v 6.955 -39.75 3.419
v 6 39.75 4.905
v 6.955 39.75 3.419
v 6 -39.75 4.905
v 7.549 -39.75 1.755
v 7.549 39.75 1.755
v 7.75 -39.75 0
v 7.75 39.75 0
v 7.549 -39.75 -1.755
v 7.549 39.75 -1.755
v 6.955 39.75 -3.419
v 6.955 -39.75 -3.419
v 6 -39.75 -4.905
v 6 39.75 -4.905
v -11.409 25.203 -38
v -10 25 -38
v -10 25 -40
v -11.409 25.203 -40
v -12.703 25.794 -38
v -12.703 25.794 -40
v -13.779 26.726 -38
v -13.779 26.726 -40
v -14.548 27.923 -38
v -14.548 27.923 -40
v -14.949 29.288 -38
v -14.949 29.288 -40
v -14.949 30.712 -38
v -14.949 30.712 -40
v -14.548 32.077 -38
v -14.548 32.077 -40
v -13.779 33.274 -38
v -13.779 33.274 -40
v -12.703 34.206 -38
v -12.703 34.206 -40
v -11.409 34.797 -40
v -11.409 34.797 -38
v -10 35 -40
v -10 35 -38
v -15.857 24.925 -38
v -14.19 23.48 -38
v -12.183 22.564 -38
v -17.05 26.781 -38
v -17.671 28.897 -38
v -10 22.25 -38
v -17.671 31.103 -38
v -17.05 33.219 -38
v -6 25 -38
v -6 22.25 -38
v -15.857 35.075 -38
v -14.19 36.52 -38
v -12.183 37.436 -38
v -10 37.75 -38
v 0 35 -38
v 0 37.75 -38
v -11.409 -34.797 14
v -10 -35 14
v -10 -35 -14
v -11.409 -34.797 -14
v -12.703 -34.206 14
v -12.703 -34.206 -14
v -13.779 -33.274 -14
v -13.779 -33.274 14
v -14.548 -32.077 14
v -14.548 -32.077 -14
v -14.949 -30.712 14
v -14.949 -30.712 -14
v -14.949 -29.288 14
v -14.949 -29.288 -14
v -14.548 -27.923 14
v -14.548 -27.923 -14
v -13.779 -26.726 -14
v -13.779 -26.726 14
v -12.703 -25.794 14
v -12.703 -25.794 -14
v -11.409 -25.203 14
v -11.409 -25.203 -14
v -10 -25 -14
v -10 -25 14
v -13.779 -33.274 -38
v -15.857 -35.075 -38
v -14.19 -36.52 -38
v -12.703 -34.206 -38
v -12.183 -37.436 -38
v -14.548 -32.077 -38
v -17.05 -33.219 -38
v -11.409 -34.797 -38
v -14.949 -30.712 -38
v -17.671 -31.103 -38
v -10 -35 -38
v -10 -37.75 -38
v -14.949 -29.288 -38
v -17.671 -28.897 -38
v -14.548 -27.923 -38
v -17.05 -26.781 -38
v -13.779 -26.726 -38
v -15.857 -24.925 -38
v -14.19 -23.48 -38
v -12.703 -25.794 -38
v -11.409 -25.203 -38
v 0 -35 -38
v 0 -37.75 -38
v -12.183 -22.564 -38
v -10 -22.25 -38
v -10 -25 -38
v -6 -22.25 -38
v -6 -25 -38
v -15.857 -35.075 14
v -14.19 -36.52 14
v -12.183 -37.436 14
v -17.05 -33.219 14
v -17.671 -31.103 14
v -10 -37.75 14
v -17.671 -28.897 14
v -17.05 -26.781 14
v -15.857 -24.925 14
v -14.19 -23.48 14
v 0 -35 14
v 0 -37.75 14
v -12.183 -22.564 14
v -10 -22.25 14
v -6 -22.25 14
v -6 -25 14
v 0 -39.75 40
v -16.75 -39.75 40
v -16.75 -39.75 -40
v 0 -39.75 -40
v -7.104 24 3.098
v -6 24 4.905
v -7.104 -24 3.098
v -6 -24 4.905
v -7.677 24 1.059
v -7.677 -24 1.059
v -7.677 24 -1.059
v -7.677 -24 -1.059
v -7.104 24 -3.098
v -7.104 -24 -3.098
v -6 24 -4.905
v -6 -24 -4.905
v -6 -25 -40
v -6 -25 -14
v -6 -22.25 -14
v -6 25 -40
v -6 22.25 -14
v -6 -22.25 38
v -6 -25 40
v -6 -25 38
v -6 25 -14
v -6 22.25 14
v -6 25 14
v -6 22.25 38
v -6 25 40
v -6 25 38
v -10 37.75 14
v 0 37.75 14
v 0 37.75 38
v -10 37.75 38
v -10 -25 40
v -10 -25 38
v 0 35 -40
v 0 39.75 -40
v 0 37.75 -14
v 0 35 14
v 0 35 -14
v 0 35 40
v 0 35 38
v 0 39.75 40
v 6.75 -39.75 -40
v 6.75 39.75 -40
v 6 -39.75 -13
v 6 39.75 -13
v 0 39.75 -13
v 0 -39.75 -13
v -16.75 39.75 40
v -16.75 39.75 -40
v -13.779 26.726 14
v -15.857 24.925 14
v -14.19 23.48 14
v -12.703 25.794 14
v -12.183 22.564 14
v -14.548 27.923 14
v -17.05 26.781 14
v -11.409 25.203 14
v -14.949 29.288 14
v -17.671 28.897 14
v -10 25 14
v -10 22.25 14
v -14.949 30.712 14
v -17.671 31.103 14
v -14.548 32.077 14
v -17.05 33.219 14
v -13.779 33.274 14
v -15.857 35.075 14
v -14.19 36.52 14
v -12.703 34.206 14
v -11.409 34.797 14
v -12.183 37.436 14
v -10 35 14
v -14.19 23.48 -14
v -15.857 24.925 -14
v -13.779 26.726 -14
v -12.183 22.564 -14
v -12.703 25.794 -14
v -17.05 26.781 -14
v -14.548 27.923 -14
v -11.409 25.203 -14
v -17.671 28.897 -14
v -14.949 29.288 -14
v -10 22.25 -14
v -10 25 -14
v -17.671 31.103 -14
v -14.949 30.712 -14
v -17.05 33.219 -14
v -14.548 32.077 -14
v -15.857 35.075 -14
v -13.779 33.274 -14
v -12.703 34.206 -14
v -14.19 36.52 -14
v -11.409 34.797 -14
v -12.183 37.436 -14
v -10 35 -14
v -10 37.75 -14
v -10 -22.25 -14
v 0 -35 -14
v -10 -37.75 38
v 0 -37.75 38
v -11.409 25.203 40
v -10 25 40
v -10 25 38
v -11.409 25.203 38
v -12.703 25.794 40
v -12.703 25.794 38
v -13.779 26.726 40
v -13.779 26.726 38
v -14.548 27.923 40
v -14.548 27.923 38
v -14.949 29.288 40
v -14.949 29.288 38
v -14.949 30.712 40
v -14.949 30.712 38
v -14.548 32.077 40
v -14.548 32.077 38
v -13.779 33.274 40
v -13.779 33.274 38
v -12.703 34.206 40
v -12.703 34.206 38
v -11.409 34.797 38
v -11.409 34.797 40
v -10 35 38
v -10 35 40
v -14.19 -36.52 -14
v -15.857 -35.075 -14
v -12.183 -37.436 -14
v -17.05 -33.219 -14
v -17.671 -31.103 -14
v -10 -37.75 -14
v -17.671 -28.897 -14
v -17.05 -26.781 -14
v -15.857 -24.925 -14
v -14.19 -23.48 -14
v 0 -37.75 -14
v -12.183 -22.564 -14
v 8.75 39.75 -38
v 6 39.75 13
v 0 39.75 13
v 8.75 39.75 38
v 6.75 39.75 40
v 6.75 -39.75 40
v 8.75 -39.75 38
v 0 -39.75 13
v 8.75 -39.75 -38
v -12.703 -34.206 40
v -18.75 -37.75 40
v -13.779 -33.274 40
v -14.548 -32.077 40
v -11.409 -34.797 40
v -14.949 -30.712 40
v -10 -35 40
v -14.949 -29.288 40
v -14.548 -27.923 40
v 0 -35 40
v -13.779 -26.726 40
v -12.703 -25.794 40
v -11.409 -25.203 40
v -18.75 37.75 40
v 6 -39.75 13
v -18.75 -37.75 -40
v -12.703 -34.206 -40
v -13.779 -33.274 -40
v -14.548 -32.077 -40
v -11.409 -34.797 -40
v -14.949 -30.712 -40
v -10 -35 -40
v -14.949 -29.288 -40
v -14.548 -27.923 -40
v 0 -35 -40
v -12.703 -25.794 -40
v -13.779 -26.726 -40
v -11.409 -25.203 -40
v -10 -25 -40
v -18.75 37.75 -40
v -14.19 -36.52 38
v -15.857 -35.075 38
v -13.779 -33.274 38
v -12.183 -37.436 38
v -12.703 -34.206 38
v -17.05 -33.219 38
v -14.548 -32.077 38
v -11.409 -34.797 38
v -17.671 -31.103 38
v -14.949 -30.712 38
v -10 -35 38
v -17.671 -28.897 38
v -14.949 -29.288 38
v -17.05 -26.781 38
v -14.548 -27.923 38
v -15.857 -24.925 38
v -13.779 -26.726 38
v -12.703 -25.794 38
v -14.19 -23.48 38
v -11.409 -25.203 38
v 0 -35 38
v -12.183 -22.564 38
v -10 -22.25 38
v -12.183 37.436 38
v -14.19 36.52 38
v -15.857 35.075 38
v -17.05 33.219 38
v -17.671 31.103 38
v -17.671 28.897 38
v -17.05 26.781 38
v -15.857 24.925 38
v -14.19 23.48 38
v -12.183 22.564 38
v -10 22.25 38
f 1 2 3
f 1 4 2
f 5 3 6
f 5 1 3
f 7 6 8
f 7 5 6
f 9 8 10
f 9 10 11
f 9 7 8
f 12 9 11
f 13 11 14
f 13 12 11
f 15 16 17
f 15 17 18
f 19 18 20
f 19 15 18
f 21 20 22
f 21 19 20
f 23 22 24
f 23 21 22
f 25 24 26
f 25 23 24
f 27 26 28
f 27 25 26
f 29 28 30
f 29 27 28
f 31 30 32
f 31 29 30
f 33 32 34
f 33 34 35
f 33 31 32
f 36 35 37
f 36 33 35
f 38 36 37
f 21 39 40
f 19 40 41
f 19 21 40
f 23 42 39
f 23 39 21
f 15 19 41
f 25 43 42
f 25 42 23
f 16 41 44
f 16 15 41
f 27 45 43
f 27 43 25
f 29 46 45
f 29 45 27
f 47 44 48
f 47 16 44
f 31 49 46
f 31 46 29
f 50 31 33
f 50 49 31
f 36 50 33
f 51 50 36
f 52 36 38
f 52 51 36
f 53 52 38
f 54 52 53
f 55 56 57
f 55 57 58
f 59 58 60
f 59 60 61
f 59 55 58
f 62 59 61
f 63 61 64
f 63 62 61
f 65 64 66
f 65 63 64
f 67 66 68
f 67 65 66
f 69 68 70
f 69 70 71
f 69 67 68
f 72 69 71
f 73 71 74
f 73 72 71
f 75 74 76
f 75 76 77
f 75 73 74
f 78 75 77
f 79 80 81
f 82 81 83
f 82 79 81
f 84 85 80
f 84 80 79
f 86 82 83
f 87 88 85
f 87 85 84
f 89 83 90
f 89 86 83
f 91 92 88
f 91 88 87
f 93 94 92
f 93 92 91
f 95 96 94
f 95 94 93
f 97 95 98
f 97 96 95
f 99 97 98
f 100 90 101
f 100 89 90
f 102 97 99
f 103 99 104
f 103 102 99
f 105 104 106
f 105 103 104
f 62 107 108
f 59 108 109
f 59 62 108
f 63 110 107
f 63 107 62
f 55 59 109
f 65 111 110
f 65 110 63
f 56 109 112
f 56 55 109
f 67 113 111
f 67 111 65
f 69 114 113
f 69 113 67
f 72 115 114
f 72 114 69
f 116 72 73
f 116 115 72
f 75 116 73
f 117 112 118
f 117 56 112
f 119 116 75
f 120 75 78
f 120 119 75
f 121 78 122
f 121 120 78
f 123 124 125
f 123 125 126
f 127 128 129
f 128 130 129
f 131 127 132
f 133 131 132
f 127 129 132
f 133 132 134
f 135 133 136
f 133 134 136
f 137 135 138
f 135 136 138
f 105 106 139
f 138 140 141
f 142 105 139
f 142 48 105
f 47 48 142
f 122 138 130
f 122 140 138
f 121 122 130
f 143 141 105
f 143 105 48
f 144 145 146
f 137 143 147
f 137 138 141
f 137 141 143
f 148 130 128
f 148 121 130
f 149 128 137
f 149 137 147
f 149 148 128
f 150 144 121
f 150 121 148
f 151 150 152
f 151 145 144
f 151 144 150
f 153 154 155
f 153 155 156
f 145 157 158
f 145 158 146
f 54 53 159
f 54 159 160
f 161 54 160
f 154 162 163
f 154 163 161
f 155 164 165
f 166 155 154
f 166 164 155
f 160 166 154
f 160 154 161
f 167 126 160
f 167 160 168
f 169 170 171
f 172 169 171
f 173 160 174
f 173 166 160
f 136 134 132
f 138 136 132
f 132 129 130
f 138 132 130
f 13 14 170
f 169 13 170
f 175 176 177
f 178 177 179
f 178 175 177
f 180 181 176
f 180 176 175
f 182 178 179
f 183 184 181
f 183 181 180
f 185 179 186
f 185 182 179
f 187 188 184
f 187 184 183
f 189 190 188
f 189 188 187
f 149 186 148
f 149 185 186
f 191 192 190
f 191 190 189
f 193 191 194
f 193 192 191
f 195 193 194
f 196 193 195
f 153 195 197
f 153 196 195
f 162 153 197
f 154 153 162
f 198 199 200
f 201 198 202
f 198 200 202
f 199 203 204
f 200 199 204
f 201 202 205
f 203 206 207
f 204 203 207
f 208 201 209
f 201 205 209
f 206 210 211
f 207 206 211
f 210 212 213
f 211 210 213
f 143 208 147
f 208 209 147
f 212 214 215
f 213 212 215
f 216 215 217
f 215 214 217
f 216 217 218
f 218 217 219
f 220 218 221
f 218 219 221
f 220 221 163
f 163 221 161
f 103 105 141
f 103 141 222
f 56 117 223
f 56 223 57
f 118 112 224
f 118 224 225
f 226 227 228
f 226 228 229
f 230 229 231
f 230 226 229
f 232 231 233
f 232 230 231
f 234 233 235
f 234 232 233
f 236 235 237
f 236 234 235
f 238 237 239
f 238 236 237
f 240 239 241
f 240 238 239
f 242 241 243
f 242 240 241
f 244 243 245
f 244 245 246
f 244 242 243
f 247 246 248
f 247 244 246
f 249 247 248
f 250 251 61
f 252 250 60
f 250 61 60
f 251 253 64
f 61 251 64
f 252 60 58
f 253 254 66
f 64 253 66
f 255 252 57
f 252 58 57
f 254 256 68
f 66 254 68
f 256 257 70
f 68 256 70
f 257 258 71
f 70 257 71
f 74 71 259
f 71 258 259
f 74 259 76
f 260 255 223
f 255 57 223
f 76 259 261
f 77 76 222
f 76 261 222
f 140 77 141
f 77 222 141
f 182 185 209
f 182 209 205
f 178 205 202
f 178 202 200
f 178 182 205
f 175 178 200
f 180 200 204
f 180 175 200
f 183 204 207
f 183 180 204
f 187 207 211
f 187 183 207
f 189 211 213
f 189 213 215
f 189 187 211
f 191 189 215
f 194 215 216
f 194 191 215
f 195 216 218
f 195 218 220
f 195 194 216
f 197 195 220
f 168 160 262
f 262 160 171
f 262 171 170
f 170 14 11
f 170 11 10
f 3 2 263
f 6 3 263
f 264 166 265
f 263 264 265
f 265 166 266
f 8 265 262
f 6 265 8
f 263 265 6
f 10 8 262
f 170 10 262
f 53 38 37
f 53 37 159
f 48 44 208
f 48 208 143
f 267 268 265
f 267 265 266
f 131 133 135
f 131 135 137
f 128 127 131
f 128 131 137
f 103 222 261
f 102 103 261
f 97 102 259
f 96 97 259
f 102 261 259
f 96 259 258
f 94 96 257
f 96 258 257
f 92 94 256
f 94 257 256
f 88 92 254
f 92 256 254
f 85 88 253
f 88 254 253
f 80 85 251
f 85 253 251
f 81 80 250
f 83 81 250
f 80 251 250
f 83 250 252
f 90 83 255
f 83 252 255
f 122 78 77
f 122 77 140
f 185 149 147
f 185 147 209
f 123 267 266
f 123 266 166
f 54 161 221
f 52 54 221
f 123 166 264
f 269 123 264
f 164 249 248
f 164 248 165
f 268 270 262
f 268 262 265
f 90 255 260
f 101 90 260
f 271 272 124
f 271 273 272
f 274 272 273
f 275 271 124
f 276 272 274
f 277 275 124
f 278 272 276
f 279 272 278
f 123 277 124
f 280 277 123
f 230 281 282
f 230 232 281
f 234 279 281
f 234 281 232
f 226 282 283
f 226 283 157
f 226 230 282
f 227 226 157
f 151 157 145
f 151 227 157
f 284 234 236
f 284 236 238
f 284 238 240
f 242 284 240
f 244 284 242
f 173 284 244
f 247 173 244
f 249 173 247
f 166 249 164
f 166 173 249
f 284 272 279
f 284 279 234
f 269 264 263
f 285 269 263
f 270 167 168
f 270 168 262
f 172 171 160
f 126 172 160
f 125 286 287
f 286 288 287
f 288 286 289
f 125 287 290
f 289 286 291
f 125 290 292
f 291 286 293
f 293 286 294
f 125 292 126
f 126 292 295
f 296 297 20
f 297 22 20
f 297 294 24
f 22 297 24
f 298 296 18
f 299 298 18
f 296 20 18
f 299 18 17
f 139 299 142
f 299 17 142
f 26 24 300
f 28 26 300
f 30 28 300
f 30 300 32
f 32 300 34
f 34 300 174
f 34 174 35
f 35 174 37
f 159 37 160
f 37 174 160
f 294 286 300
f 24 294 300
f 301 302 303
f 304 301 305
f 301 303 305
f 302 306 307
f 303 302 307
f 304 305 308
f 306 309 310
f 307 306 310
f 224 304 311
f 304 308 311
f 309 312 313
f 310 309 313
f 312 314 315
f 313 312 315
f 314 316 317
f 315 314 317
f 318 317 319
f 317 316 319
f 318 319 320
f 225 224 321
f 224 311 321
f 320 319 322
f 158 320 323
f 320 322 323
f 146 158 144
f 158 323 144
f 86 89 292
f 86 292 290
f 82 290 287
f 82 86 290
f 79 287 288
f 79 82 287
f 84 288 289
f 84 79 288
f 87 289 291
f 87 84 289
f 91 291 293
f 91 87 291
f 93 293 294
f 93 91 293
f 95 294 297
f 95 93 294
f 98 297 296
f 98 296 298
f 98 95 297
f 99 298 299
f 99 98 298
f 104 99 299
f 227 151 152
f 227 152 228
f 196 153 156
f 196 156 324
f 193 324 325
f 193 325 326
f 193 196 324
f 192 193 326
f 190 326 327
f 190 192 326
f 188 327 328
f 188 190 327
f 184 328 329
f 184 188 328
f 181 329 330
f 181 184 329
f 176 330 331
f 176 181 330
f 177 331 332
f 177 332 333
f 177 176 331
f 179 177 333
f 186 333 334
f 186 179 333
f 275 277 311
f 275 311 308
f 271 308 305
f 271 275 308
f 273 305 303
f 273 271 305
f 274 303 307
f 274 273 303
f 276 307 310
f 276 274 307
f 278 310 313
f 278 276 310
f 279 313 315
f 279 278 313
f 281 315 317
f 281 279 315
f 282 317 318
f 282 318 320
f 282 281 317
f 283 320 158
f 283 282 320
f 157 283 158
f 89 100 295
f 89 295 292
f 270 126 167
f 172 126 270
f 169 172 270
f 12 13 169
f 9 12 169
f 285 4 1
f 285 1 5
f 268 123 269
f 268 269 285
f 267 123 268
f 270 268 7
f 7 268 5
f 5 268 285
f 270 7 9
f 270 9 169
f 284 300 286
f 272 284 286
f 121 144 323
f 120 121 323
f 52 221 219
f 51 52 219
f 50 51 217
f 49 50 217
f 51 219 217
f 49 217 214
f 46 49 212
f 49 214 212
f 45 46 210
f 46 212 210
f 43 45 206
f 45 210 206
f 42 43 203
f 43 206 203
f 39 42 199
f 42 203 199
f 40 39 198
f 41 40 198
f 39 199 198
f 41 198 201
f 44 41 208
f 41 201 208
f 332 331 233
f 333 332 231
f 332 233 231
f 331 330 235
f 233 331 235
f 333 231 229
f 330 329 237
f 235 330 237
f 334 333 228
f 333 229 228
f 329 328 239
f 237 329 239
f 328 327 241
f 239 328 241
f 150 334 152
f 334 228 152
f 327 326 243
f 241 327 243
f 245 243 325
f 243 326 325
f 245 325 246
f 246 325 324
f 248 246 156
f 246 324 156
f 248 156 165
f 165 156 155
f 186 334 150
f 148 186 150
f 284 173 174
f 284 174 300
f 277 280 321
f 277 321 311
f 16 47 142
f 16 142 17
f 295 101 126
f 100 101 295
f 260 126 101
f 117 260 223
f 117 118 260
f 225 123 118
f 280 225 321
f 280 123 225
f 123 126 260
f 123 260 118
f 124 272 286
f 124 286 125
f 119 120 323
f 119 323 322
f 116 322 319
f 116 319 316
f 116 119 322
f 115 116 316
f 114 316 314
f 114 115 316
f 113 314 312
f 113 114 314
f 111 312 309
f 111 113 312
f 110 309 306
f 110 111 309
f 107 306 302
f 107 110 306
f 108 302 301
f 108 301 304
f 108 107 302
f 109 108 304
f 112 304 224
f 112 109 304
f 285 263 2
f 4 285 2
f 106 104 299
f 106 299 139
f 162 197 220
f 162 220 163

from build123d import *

# Parameters (mm, degrees)
F2_DEPTH = 40
F3_START = 14
F3_DEPTH = 24
F4_START = -14
F4_DEPTH = 24
F6_DEPTH = 24
F7_DEPTH = 39.75


with BuildPart() as f2:
    # F1 (on Top) → F2 (new body, symmetric)
    with BuildSketch(Plane.XY):
        with BuildLine():
            ThreePointArc((-10, 22.25), (-17.75, 30), (-10, 37.75))
            Line((-10, 37.75), (0, 37.75))
            Line((0, 37.75), (0, 39.75))
            Line((0, 39.75), (-10, 39.75))
            Line((-10, 39.75), (-16.75, 39.75))
            Line((-16.75, 39.75), (-18.75, 37.75))
            Line((-18.75, 37.75), (-18.75, -37.75))
            Line((-18.75, -37.75), (-16.75, -39.75))
            Line((-16.75, -39.75), (-10, -39.75))
            Line((-10, -39.75), (0, -39.75))
            Line((0, -39.75), (0, -37.75))
            Line((0, -37.75), (-10, -37.75))
            ThreePointArc((-10, -37.75), (-17.75, -30), (-10, -22.25))
            Line((-10, -22.25), (-6, -22.25))
            Line((-6, -22.25), (-6, 22.25))
            Line((-6, 22.25), (-10, 22.25))
        make_face()
        with BuildLine():
            Line((0, 37.75), (-10, 37.75))
            ThreePointArc((-10, 37.75), (-17.75, 30), (-10, 22.25))
            Line((-10, 22.25), (-6, 22.25))
            Line((-6, 22.25), (-6, 25))
            Line((-6, 25), (-10, 25))
            ThreePointArc((-10, 25), (-15, 30), (-10, 35))
            Line((-10, 35), (0, 35))
            Line((0, 35), (0, 37.75))
        make_face()
        with BuildLine():
            Line((-6, -25), (-6, -22.25))
            Line((-6, -22.25), (-10, -22.25))
            ThreePointArc((-10, -22.25), (-17.75, -30), (-10, -37.75))
            Line((-10, -37.75), (0, -37.75))
            Line((0, -37.75), (0, -35))
            Line((0, -35), (-10, -35))
            ThreePointArc((-10, -35), (-15, -30), (-10, -25))
            Line((-10, -25), (-6, -25))
        make_face()
    extrude(amount=F2_DEPTH, both=True)

    # F1 (on Top) → F3 (cut)
    with BuildSketch(Plane.XY.offset(F3_START)):
        with BuildLine():
            Line((0, 37.75), (-10, 37.75))
            ThreePointArc((-10, 37.75), (-17.75, 30), (-10, 22.25))
            Line((-10, 22.25), (-6, 22.25))
            Line((-6, 22.25), (-6, 25))
            Line((-6, 25), (-10, 25))
            ThreePointArc((-10, 25), (-15, 30), (-10, 35))
            Line((-10, 35), (0, 35))
            Line((0, 35), (0, 37.75))
        make_face()
        with BuildLine():
            Line((-6, -25), (-6, -22.25))
            Line((-6, -22.25), (-10, -22.25))
            ThreePointArc((-10, -22.25), (-17.75, -30), (-10, -37.75))
            Line((-10, -37.75), (0, -37.75))
            Line((0, -37.75), (0, -35))
            Line((0, -35), (-10, -35))
            ThreePointArc((-10, -35), (-15, -30), (-10, -25))
            Line((-10, -25), (-6, -25))
        make_face()
    extrude(amount=F3_DEPTH, mode=Mode.SUBTRACT)

    # F1 (on Top) → F4 (cut)
    with BuildSketch(Plane.XY.offset(F4_START)):
        with BuildLine():
            Line((-6, -25), (-6, -22.25))
            Line((-6, -22.25), (-10, -22.25))
            ThreePointArc((-10, -22.25), (-17.75, -30), (-10, -37.75))
            Line((-10, -37.75), (0, -37.75))
            Line((0, -37.75), (0, -35))
            Line((0, -35), (-10, -35))
            ThreePointArc((-10, -35), (-15, -30), (-10, -25))
            Line((-10, -25), (-6, -25))
        make_face()
        with BuildLine():
            Line((0, 37.75), (-10, 37.75))
            ThreePointArc((-10, 37.75), (-17.75, 30), (-10, 22.25))
            Line((-10, 22.25), (-6, 22.25))
            Line((-6, 22.25), (-6, 25))
            Line((-6, 25), (-10, 25))
            ThreePointArc((-10, 25), (-15, 30), (-10, 35))
            Line((-10, 35), (0, 35))
            Line((0, 35), (0, 37.75))
        make_face()
    extrude(amount=-F4_DEPTH, mode=Mode.SUBTRACT)

    # F5 (on Front) → F6 (cut, symmetric)
    with BuildSketch(Plane.XZ):
        with BuildLine():
            ThreePointArc((6, -4.9053542176), (7.2994006603, -2.604083332), (7.75, 0))
            ThreePointArc((7.75, 0), (7.2994006603, 2.604083332), (6, 4.9053542176))
            ThreePointArc((6, 4.9053542176), (-7.75, 0), (6, -4.9053542176))
        make_face()
    extrude(amount=F6_DEPTH, both=True, mode=Mode.SUBTRACT)


with BuildPart() as f7:
    # F5 (on Front) → F7 (new body, symmetric)
    with BuildSketch(Plane.XZ):
        with BuildLine():
            ThreePointArc((6, 4.9053542176), (7.2994006603, 2.604083332), (7.75, 0))
            ThreePointArc((7.75, 0), (7.2994006603, -2.604083332), (6, -4.9053542176))
            Line((6, -4.9053542176), (6, -13))
            Line((6, -13), (0, -13))
            Line((0, -13), (0, -40))
            Line((0, -40), (6.75, -40))
            Line((6.75, -40), (8.75, -38))
            Line((8.75, -38), (8.75, 38))
            Line((8.75, 38), (6.75, 40))
            Line((6.75, 40), (0, 40))
            Line((0, 40), (0, 13))
            Line((0, 13), (6, 13))
            Line((6, 13), (6, 4.9053542176))
        make_face()
    extrude(amount=F7_DEPTH, both=True)


solid = Compound([f2.part, f7.part])
